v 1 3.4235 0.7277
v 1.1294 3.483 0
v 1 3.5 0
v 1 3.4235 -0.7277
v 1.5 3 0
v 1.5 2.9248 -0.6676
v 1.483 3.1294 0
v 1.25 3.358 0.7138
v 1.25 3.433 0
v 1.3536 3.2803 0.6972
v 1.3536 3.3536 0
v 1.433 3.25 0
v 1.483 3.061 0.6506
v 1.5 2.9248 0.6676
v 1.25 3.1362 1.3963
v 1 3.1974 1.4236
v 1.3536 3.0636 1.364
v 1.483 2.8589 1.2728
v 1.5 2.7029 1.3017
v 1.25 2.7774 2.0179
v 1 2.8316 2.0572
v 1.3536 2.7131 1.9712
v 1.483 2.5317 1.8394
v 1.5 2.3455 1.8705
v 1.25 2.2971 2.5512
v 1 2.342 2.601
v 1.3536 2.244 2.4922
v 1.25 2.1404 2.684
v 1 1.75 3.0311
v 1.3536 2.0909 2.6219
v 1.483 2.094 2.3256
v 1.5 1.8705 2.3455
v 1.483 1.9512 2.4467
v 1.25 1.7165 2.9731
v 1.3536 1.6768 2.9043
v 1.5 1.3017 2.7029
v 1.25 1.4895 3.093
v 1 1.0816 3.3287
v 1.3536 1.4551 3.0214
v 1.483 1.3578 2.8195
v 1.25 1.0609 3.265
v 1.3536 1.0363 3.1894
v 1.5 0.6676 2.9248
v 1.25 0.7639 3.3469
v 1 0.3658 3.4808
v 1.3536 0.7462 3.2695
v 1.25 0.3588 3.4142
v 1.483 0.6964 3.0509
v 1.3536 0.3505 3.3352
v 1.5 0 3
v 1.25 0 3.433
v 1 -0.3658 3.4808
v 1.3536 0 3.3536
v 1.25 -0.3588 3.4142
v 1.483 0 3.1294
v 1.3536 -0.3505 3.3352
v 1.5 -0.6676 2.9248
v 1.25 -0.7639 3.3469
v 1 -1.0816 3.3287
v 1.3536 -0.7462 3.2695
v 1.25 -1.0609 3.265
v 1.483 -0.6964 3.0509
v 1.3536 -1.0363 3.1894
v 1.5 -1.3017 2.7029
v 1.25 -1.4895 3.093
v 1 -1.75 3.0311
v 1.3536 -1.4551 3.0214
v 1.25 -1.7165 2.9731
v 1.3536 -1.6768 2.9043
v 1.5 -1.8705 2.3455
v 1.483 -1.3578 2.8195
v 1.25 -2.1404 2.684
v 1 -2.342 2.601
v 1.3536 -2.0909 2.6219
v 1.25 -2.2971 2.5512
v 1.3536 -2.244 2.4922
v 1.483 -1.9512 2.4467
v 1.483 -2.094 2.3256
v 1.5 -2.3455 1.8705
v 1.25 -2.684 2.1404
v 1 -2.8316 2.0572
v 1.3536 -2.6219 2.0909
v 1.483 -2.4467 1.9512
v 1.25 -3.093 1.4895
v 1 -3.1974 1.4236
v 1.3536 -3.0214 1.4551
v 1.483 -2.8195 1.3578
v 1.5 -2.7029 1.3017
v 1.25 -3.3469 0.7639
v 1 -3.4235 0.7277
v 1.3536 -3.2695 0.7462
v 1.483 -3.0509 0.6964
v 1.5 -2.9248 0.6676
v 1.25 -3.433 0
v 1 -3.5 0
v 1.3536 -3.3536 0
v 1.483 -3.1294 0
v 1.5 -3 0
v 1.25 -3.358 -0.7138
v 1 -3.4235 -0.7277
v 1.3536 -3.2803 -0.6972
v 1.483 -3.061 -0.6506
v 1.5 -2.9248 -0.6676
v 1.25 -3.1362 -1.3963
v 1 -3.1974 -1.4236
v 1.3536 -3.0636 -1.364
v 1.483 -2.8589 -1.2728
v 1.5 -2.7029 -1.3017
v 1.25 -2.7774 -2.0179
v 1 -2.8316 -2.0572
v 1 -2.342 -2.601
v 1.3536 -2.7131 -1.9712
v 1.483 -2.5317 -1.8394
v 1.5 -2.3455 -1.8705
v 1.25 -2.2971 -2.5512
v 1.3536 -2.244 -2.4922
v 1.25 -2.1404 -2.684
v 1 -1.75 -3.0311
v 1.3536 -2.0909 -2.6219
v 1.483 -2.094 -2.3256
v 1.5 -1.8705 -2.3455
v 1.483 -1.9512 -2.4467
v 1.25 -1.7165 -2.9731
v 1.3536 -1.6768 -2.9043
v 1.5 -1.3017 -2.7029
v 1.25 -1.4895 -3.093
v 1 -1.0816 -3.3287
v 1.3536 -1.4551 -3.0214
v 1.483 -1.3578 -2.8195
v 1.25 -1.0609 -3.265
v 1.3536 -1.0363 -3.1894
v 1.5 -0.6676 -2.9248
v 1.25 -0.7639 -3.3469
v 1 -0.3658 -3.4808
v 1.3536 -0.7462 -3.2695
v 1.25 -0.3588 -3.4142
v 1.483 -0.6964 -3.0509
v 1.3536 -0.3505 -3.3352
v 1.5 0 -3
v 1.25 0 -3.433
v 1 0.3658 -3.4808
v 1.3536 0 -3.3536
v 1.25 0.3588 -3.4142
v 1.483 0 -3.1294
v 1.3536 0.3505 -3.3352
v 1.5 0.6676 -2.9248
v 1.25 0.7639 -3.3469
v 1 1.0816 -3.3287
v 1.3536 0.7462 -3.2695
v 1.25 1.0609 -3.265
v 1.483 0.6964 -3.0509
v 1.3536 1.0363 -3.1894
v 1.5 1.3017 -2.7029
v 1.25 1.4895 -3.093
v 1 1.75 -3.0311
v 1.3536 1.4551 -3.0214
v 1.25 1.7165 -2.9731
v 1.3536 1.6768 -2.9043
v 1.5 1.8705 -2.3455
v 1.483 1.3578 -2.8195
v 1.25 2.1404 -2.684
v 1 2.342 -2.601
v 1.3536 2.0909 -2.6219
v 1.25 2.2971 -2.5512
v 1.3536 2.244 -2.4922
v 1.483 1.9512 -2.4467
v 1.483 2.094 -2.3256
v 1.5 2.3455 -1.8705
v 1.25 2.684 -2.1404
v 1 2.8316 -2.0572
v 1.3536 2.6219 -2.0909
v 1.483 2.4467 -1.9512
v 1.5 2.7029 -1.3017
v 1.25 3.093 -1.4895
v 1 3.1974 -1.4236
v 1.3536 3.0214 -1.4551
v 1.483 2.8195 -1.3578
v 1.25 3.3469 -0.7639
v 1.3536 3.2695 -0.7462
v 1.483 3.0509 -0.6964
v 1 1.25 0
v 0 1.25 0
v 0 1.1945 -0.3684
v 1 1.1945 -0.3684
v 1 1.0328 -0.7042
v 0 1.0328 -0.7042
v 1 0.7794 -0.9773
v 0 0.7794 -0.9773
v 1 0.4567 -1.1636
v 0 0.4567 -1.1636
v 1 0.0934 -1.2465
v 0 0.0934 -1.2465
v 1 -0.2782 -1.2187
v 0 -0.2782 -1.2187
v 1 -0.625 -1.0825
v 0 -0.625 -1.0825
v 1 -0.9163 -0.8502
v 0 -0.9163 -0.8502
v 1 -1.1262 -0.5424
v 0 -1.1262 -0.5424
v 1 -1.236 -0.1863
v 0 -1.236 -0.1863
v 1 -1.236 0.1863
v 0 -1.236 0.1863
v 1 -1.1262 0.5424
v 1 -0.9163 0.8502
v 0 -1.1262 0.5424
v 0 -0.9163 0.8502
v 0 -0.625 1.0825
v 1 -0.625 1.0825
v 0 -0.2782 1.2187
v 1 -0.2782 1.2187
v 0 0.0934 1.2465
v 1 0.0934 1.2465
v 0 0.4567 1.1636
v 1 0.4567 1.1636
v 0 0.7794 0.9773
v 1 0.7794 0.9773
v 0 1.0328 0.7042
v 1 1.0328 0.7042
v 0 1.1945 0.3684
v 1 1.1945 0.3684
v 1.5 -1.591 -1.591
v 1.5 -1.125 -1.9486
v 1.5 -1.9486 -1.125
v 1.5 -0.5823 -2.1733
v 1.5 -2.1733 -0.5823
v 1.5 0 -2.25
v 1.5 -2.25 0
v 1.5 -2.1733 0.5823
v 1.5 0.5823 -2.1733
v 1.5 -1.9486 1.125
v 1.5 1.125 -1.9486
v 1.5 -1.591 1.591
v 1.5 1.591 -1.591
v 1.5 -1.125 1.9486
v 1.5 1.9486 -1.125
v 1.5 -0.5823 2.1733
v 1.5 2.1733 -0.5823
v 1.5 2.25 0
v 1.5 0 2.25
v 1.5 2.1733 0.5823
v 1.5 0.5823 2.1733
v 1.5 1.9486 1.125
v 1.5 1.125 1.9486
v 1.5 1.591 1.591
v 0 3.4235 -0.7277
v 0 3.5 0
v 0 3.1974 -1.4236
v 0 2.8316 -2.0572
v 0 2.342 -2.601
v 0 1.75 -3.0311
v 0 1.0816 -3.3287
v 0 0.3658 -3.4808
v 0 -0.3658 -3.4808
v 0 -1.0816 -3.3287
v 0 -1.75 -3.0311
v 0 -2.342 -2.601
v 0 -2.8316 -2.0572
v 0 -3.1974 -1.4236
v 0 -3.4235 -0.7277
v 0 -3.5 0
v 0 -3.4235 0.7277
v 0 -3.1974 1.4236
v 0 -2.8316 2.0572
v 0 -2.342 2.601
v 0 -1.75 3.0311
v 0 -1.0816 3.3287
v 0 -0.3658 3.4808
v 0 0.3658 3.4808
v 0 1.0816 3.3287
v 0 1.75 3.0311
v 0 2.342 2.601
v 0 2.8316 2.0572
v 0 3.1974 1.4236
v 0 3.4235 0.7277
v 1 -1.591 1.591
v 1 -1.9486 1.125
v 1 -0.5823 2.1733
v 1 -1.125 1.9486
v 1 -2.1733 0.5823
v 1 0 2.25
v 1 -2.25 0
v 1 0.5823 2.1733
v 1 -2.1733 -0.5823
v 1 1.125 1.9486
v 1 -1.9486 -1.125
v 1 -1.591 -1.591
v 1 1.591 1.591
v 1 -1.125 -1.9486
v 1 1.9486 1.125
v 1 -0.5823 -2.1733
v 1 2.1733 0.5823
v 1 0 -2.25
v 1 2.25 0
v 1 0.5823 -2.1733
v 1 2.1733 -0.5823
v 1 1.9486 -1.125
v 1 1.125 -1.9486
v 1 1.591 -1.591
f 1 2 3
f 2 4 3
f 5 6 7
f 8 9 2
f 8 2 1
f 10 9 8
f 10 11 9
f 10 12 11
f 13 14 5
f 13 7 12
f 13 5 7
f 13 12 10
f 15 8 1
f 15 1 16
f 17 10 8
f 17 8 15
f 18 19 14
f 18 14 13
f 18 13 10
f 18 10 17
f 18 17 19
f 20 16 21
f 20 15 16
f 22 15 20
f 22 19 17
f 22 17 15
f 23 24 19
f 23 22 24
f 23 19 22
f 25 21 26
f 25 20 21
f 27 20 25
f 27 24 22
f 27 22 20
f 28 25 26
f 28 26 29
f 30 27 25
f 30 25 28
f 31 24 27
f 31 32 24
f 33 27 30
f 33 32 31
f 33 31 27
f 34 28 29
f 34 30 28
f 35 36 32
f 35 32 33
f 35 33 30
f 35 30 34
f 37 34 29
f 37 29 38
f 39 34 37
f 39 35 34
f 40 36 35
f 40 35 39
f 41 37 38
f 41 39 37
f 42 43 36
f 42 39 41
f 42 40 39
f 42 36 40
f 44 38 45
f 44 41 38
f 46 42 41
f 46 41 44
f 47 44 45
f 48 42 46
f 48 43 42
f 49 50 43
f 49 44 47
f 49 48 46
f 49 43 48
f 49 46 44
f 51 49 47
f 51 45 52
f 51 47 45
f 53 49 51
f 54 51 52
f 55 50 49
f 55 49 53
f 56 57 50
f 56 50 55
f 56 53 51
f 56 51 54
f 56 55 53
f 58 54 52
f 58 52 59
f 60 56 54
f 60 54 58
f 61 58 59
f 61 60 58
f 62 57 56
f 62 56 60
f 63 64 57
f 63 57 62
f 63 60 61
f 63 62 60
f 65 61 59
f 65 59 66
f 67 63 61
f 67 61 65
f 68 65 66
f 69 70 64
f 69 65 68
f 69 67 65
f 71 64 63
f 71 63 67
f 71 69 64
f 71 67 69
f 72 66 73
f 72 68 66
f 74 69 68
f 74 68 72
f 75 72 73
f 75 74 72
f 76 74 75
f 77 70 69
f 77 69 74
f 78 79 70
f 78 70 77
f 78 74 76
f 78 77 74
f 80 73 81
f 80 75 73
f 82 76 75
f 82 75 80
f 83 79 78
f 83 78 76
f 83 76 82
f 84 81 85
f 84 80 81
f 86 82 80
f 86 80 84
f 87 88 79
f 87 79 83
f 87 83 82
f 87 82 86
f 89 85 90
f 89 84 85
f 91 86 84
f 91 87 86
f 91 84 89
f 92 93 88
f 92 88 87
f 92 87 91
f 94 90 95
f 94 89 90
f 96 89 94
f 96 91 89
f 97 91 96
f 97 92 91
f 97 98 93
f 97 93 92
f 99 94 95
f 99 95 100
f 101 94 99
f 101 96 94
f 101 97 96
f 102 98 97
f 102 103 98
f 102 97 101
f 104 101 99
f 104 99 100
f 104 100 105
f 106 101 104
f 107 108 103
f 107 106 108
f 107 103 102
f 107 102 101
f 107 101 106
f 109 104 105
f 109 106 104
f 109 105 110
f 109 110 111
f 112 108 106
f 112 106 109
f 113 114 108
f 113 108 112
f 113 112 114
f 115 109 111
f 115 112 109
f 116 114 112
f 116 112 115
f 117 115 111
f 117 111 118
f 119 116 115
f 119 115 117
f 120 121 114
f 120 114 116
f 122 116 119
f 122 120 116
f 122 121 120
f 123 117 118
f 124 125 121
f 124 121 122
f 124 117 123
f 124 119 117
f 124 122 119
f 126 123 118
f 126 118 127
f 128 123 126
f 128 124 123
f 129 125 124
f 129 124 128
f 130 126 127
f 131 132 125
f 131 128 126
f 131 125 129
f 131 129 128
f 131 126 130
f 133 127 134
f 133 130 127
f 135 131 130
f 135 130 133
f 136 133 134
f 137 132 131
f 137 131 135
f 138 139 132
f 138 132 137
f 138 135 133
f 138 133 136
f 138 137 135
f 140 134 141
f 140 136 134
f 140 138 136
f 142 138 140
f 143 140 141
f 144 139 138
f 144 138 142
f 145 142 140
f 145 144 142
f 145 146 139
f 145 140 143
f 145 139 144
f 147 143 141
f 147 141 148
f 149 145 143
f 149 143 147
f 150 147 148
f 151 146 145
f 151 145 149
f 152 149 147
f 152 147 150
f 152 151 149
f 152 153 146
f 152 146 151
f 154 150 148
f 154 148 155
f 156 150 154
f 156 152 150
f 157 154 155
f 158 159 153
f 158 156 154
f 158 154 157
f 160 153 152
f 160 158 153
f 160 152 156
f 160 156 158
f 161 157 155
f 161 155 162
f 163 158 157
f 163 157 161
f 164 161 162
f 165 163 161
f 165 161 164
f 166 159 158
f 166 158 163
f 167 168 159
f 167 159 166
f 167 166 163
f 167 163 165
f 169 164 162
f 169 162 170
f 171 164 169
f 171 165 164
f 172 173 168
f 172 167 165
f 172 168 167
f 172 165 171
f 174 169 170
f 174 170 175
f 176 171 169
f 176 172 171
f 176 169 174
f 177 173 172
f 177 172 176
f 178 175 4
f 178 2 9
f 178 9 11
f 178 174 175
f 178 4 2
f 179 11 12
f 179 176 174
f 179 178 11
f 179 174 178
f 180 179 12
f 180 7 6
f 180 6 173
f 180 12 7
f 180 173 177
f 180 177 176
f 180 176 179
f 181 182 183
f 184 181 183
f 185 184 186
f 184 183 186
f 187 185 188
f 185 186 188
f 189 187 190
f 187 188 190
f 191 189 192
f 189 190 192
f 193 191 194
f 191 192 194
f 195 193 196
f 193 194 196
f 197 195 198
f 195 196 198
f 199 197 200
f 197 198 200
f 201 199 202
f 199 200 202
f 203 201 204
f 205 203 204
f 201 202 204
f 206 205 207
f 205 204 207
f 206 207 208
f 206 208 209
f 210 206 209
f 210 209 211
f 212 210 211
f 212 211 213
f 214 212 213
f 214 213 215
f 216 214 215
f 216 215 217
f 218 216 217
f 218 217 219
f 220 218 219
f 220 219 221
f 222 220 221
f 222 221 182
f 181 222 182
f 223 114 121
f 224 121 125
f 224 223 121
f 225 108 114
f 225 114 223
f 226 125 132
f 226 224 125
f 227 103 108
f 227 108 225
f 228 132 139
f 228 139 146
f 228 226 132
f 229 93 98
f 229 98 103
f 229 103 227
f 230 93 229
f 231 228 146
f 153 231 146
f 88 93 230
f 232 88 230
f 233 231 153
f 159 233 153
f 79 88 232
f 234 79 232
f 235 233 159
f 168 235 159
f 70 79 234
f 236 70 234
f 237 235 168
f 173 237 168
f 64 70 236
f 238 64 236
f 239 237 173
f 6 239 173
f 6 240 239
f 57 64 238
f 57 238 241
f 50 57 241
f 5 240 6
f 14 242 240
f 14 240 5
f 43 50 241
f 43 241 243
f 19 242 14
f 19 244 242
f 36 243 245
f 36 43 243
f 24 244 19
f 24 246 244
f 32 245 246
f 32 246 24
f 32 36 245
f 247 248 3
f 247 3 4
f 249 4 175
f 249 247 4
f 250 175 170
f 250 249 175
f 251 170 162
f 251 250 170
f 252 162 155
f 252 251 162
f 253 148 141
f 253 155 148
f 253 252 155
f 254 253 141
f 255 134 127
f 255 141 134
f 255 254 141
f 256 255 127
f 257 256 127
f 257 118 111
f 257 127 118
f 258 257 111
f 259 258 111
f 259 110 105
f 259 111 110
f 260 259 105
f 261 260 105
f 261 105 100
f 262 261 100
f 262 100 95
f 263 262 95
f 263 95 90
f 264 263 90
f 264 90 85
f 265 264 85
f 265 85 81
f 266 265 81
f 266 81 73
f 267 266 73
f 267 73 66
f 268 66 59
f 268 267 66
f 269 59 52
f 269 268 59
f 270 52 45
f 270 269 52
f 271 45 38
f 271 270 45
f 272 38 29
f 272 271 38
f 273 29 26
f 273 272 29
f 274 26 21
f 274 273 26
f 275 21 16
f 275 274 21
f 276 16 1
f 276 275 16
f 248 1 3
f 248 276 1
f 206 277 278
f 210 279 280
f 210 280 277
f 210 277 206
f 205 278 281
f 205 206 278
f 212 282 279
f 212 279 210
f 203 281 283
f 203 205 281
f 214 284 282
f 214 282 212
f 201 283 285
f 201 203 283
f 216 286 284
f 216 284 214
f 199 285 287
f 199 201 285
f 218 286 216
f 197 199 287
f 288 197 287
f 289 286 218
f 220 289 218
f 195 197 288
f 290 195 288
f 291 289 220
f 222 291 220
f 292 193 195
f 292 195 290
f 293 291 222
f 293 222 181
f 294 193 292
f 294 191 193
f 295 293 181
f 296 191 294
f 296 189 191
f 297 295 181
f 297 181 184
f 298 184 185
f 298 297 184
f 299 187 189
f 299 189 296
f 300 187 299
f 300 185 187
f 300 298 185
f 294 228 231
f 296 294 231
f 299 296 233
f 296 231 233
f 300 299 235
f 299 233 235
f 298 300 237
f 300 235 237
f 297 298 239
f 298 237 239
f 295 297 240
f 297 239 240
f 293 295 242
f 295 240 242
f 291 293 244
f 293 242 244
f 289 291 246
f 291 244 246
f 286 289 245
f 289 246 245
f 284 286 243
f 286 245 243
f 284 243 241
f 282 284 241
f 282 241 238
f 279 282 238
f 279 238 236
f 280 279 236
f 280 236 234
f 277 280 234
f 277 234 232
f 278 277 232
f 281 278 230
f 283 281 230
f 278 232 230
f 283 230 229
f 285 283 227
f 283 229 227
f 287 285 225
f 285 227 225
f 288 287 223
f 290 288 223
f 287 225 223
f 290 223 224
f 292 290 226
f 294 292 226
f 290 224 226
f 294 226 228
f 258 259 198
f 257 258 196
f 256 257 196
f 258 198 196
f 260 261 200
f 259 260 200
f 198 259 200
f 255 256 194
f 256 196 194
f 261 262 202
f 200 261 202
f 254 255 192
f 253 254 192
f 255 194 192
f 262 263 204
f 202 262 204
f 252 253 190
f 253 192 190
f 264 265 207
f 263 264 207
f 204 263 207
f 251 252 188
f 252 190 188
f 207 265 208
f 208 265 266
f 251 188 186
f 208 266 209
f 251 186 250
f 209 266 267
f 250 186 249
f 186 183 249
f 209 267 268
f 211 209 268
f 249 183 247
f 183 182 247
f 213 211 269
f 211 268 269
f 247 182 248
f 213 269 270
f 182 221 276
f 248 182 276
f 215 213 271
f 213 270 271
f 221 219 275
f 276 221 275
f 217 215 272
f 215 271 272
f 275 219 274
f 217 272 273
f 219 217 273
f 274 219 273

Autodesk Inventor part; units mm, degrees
ref_plane "YZ Plane" through (0, 0, 0) normal (1, 0, 0) x (0, 1, 0)
ref_plane "XZ Plane" through (0, 0, 0) normal (0, 1, 0) x (-1, 0, 0)
ref_plane "XY Plane" through (0, 0, 0) normal (0, 0, 1) x (1, 0, 0)
sketch "Sketch1" plane through (0, 0, 0) normal (1, 0, 0) x (0, 1, 0)
  circle A0 centre (0, 0) radius 3.5
  circle A1 centre (0, 0) radius 1.25
  dimension "d0" = 7
  dimension "d1" = 2.5
extrude "Extrusion1" add sketch "Sketch1" along normal blind 1.5
sketch "Sketch2" plane through (1.5, 0, 0) normal (1, 0, 0) x (0, 0, -1)
  circle A0 centre (0, 0) radius 2.25
  dimension "d4" = 4.5
extrude "Extrusion2" cut sketch "Sketch2" against normal blind 0.5
fillet "Fillet1" radius 0.5 1 edges at (1.5, -3.5, 0)
properties part number "H205_lower_linkage_washer"
